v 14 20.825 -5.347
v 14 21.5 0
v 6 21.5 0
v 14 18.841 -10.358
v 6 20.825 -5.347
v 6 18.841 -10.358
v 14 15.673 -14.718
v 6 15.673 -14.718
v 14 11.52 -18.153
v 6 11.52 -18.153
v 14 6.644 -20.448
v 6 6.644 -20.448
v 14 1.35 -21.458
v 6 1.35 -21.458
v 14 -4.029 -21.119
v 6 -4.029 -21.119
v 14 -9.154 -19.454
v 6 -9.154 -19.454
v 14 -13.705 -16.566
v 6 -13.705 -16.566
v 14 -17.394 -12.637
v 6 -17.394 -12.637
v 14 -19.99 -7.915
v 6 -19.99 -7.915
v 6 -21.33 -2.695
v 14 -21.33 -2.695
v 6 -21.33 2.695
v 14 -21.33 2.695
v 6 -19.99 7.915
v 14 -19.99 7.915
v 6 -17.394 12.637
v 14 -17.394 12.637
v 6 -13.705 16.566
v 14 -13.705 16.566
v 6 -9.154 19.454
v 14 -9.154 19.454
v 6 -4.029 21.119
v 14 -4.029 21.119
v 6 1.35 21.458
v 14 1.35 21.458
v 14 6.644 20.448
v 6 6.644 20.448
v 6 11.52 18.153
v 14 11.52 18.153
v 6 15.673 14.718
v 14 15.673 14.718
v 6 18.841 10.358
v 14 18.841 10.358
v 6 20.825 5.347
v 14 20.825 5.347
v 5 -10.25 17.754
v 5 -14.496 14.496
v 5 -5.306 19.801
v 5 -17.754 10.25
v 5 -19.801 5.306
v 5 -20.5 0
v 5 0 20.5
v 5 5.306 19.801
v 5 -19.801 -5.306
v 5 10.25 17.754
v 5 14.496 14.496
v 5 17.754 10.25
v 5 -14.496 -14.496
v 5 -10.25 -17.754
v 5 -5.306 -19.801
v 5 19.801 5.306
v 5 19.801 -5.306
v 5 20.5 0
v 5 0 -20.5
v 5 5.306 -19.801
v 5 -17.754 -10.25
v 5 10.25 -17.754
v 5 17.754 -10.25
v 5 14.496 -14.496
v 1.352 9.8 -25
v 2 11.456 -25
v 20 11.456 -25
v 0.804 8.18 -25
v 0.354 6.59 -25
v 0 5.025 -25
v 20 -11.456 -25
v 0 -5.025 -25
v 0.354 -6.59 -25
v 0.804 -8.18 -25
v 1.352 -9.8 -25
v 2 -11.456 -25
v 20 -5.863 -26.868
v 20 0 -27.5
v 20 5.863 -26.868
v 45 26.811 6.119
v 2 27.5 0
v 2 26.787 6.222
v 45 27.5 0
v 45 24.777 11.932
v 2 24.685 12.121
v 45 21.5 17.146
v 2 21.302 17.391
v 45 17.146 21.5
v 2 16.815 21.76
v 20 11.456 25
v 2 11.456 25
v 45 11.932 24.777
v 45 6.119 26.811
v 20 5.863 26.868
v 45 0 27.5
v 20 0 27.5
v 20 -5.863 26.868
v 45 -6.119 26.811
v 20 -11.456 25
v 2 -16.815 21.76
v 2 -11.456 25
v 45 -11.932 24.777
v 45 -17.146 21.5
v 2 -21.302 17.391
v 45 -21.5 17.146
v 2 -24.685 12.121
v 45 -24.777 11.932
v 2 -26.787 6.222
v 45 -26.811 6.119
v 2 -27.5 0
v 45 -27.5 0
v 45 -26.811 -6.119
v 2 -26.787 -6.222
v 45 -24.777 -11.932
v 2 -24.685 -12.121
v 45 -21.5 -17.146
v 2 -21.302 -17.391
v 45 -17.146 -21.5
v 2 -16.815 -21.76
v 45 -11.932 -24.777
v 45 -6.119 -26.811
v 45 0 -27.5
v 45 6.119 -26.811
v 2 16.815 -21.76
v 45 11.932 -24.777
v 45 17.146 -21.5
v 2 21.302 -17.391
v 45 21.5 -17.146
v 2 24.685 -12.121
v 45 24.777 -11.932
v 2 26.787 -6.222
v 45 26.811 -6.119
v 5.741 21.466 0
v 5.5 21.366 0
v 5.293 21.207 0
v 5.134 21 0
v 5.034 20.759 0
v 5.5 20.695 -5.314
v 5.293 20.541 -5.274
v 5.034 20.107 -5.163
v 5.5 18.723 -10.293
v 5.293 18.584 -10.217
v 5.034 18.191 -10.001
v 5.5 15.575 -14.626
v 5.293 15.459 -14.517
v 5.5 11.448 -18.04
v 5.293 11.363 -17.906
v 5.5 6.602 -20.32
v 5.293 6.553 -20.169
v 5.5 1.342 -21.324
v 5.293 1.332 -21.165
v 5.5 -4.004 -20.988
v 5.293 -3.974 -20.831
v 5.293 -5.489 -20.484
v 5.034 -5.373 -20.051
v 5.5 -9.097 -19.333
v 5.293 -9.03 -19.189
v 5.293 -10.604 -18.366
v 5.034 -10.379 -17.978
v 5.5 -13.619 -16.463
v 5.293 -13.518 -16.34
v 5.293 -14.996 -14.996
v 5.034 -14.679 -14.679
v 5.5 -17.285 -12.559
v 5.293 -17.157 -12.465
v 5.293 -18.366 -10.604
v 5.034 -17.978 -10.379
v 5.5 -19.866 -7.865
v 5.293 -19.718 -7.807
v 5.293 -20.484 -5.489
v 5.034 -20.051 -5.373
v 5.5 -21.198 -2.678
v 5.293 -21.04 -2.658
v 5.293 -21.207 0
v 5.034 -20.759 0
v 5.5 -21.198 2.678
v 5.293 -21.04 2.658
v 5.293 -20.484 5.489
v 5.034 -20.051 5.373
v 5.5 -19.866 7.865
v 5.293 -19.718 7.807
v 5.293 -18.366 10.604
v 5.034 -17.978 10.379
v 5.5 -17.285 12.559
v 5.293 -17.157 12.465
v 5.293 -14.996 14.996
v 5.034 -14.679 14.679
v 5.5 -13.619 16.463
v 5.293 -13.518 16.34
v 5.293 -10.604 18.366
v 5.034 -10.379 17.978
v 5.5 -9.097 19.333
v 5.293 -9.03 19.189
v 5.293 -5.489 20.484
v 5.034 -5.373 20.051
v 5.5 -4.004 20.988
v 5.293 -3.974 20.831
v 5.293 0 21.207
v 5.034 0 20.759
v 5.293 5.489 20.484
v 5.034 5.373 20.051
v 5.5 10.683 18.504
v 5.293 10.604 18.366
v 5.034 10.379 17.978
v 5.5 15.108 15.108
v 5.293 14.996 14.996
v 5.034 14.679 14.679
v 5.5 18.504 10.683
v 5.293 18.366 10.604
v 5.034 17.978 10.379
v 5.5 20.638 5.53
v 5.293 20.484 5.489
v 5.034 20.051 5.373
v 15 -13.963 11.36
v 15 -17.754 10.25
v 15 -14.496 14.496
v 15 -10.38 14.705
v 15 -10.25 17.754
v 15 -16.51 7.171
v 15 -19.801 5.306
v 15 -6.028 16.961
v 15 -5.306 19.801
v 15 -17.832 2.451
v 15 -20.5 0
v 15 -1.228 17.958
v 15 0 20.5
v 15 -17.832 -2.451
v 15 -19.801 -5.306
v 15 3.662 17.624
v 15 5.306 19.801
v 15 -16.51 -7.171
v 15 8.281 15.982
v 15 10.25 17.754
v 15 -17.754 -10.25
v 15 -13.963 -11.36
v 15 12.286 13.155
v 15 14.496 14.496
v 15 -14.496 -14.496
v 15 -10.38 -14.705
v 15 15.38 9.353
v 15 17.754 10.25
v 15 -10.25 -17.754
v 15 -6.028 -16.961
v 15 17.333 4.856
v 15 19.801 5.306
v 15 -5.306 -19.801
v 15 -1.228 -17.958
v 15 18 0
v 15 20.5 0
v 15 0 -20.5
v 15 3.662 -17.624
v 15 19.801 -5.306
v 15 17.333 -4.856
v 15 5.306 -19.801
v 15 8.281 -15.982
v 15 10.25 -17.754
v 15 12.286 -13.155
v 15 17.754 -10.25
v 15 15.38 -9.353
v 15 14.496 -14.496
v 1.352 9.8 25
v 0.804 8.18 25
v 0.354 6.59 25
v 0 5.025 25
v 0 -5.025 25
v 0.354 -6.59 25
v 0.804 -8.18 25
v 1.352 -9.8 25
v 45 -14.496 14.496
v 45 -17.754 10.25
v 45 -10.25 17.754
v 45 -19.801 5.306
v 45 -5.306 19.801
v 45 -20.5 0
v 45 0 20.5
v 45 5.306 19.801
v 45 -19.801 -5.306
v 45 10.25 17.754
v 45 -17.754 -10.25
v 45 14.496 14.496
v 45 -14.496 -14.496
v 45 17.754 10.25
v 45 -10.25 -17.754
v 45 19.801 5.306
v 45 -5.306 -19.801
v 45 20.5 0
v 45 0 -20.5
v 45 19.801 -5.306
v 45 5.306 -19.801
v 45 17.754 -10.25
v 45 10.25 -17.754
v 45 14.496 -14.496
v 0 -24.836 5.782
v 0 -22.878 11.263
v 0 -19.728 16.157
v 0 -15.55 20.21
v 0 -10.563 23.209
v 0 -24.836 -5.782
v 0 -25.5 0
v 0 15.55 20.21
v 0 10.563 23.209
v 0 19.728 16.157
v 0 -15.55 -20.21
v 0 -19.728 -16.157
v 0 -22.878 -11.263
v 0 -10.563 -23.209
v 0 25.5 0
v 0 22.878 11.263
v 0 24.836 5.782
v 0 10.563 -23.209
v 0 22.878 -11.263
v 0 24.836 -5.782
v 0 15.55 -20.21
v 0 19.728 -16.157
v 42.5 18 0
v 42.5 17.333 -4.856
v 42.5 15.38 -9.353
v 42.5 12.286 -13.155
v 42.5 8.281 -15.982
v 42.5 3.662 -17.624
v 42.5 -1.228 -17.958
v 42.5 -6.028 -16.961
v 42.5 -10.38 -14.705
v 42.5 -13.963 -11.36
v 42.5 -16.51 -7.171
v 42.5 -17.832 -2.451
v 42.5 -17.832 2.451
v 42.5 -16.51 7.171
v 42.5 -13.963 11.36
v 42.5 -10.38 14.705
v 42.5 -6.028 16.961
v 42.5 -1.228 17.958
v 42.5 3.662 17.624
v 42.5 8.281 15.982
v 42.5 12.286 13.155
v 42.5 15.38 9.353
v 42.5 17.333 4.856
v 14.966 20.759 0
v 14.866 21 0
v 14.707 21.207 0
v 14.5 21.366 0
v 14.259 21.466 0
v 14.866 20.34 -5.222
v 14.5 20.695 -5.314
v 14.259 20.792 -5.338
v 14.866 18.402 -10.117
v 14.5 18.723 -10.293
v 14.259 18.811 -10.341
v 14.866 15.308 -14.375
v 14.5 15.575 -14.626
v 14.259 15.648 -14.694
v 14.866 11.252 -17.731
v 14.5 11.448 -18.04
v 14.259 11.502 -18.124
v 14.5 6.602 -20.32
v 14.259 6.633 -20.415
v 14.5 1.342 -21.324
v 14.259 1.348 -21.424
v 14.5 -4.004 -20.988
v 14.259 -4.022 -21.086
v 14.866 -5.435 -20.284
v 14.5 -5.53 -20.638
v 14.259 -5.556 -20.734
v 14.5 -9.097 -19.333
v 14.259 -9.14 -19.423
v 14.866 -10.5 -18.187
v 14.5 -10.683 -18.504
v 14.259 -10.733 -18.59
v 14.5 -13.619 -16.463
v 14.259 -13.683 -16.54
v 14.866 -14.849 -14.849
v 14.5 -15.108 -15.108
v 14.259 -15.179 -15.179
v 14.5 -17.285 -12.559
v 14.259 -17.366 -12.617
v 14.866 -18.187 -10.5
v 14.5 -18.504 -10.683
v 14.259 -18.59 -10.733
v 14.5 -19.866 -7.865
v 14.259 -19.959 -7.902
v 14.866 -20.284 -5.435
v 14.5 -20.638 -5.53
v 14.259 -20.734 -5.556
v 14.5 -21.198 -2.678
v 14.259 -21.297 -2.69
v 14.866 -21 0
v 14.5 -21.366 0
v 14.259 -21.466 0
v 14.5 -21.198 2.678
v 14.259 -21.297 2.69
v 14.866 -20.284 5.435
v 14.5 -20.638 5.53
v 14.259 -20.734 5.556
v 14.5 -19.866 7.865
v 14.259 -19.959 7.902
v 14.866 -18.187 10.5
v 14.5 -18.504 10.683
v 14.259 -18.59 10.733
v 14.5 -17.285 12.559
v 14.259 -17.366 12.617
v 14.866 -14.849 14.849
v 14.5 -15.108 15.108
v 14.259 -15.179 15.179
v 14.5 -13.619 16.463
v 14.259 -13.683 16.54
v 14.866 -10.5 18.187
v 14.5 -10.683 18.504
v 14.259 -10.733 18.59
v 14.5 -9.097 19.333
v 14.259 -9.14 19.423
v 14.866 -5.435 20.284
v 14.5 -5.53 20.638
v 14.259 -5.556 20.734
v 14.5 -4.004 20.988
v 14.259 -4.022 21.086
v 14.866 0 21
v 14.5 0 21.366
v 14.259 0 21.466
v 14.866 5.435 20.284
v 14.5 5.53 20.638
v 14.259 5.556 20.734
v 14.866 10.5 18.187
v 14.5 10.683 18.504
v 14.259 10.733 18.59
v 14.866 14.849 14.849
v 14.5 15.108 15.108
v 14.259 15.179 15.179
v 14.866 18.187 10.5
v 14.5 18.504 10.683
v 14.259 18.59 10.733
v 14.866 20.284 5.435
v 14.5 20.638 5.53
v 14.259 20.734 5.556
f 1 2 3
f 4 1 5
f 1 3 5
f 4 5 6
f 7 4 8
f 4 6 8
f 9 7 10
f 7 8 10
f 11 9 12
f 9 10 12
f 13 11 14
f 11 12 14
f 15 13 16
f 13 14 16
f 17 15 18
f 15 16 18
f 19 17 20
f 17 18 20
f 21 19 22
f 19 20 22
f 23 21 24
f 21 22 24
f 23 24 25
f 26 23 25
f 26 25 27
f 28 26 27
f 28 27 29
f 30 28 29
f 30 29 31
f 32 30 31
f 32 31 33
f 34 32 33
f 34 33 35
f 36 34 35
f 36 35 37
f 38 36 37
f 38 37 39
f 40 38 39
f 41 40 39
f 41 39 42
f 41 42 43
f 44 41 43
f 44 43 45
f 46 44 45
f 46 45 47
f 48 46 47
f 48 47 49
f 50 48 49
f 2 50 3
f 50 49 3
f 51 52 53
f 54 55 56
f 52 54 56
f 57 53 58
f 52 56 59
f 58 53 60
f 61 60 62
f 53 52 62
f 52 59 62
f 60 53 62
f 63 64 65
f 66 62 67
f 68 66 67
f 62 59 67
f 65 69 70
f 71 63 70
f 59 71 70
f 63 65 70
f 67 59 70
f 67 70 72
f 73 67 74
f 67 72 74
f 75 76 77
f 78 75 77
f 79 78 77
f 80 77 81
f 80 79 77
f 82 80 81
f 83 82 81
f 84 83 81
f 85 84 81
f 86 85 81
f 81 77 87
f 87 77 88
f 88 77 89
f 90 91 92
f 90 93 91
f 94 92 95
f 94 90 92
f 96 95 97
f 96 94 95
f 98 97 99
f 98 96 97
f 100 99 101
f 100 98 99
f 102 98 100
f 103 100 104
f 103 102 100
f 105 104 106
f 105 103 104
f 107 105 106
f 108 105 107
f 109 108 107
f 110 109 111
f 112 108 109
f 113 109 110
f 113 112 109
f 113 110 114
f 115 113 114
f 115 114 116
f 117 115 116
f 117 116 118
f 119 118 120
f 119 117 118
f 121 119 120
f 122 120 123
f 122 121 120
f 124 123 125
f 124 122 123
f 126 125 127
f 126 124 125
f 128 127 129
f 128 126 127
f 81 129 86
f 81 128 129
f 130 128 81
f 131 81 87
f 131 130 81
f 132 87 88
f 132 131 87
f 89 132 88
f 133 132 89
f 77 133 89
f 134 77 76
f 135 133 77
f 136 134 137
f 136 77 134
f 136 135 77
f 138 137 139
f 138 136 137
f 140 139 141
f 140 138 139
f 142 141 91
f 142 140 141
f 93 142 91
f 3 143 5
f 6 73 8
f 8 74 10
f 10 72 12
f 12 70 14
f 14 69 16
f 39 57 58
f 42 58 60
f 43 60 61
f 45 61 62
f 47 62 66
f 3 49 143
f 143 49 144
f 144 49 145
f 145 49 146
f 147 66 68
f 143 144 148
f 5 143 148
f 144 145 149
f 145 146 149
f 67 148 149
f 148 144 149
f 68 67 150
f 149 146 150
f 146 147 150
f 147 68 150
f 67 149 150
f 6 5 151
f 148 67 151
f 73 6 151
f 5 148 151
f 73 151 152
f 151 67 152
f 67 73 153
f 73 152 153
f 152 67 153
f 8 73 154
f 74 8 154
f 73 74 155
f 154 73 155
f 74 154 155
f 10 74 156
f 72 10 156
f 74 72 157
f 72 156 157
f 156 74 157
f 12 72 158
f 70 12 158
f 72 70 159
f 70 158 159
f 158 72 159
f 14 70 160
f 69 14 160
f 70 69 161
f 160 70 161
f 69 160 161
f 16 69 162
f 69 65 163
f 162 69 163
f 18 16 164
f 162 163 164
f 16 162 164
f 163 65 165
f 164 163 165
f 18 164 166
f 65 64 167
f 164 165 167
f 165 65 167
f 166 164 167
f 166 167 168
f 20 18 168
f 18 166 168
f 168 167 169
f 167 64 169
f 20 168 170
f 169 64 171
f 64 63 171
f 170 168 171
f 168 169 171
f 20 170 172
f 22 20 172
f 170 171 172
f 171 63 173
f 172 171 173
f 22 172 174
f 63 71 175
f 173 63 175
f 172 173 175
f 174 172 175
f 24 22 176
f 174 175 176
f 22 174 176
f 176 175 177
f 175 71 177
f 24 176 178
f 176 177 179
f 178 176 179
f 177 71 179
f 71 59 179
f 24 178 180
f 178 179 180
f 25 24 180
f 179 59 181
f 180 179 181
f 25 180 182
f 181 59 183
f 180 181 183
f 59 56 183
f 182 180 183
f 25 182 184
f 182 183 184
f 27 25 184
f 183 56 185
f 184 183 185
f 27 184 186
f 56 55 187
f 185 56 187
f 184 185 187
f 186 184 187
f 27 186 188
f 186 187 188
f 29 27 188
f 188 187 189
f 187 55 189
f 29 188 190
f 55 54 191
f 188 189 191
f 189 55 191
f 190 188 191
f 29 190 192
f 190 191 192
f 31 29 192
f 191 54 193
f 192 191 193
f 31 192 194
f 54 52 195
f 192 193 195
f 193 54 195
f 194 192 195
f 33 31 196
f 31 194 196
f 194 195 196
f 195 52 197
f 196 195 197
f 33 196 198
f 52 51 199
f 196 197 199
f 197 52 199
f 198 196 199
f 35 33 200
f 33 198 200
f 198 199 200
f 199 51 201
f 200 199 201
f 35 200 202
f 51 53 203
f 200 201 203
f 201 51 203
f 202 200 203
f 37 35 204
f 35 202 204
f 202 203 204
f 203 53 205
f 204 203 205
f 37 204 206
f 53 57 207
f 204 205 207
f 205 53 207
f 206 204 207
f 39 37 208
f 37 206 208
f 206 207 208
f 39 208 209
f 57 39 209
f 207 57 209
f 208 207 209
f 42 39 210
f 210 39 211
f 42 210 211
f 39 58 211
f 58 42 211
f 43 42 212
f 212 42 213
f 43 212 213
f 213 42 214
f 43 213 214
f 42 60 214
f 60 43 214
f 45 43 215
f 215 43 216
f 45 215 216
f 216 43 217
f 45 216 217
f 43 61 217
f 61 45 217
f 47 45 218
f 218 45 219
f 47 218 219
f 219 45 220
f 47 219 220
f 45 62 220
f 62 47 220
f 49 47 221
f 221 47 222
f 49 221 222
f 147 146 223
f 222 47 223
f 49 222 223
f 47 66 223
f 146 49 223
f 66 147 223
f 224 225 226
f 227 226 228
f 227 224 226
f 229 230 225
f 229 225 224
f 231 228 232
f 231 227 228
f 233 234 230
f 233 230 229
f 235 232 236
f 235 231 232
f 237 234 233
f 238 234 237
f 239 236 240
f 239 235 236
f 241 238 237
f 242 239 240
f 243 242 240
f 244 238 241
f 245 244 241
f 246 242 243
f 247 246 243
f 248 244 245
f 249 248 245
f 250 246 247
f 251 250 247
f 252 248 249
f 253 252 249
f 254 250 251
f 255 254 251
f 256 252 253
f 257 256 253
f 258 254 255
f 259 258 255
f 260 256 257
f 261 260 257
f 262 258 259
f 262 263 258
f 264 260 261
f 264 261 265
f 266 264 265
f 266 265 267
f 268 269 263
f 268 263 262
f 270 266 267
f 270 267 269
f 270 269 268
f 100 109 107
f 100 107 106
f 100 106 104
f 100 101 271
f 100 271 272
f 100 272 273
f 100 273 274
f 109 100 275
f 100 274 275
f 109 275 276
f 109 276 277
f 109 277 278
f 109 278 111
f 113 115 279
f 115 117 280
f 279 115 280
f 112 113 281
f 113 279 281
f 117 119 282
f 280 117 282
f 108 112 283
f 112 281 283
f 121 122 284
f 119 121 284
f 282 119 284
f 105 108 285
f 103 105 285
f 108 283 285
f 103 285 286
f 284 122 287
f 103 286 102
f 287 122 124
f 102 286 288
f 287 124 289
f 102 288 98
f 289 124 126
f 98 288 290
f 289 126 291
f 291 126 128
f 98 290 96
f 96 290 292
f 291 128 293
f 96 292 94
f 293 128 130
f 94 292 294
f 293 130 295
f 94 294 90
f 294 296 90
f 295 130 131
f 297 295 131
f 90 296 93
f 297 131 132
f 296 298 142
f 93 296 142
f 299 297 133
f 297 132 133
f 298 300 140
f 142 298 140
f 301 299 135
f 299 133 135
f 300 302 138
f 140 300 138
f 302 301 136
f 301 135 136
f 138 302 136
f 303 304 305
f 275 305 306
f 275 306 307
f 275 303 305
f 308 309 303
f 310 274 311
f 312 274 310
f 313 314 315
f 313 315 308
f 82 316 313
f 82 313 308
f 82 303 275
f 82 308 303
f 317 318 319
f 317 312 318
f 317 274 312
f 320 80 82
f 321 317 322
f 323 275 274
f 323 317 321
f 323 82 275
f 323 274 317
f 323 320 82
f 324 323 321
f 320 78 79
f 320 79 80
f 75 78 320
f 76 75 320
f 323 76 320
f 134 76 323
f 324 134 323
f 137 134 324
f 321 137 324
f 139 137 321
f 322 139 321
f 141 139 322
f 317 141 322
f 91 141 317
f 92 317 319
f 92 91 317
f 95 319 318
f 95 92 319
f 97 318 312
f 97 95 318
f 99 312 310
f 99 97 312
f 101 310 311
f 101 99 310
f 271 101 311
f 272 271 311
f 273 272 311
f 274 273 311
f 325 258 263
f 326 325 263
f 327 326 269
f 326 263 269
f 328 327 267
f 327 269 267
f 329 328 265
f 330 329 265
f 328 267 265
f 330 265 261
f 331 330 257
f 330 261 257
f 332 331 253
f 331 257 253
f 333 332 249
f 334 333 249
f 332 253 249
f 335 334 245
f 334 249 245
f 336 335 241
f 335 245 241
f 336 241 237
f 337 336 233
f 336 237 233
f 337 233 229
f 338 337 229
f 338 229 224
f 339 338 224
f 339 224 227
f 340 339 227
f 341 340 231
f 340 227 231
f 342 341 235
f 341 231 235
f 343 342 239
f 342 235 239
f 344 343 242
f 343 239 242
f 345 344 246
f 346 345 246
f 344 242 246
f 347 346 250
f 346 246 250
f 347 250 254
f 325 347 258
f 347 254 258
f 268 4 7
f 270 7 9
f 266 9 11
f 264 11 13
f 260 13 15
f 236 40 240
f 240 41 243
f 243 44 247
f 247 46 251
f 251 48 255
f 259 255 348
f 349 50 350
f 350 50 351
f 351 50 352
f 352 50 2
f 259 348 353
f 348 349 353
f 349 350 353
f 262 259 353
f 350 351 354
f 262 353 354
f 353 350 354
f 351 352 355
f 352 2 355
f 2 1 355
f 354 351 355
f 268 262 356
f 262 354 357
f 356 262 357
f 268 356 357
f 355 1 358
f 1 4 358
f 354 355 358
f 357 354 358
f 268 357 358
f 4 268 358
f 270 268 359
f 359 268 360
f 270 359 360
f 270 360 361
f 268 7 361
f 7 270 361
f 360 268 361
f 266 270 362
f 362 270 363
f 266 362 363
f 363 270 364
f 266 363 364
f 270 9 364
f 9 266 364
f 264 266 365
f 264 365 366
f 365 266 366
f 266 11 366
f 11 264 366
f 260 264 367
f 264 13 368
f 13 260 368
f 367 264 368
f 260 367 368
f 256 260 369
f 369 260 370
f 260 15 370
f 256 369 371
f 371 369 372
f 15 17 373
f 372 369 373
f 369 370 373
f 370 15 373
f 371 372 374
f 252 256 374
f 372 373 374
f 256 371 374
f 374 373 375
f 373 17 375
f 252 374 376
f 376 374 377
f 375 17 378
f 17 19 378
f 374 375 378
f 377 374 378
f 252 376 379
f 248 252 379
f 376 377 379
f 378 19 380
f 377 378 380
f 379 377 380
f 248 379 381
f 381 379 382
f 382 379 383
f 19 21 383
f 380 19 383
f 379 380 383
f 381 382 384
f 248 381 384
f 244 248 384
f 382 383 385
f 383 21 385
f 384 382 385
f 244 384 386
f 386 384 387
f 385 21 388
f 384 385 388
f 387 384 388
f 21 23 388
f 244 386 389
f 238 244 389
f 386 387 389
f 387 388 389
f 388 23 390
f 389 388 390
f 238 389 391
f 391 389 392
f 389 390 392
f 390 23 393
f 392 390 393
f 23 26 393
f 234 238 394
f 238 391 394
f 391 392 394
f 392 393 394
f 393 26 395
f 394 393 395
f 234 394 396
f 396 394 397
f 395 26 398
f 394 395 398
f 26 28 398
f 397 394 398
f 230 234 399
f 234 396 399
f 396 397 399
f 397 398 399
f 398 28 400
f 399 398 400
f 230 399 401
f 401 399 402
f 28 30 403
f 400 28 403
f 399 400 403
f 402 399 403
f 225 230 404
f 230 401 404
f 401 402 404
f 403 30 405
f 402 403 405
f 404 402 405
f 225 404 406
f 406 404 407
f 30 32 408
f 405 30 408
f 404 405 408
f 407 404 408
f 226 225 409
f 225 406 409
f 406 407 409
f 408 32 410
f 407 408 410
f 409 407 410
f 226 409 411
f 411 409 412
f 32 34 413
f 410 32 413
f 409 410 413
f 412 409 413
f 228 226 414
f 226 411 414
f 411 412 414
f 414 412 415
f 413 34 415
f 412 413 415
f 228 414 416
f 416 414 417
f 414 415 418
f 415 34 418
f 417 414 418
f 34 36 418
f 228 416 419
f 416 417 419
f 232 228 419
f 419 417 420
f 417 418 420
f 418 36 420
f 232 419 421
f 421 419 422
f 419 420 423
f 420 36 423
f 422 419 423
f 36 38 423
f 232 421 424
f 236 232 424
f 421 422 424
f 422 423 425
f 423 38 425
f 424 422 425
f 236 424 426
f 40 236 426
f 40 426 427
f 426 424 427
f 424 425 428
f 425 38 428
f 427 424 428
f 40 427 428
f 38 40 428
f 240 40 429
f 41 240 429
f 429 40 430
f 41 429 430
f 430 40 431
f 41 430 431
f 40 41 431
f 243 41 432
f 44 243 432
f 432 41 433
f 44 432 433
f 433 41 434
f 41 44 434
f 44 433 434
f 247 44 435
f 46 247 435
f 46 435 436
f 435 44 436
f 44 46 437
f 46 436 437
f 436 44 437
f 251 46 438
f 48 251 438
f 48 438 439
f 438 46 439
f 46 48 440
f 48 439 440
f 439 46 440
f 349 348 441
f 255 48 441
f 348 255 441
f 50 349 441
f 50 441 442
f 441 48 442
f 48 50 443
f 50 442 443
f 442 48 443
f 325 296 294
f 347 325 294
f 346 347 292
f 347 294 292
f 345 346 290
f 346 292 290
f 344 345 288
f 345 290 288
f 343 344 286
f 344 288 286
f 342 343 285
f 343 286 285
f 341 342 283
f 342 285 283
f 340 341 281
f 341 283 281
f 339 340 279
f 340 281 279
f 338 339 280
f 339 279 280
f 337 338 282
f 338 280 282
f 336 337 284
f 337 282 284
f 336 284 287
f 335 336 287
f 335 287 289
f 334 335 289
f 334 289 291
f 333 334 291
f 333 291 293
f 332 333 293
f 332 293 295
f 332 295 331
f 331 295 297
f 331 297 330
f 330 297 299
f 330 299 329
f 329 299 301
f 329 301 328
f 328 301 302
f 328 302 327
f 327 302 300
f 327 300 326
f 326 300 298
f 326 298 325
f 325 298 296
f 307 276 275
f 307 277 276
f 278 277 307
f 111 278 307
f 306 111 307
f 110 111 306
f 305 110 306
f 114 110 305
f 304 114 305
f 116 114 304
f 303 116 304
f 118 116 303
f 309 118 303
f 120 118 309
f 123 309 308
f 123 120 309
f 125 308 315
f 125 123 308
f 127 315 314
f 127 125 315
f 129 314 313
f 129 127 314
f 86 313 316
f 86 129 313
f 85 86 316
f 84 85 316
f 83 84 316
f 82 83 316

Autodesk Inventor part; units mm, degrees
ref_plane "YZ Plane" through (0, 0, 0) normal (1, 0, 0) x (0, 1, 0)
ref_plane "XZ Plane" through (0, 0, 0) normal (0, 1, 0) x (-1, 0, 0)
ref_plane "XY Plane" through (0, 0, 0) normal (0, 0, 1) x (1, 0, 0)
sketch "Esboço1" plane through (0, 0, 0) normal (0, 0, 1) x (1, 0, 0)
  line L0 (0, 0) -> (0, 27.5)
  line L1 (0, 27.5) -> (45, 27.5)
  line L2 (45, 27.5) -> (45, 18)
  line L3 (45, 18) -> (15, 18)
  line L4 (15, 18) -> (15, 20.5)
  line L5 (14, 21.5) -> (6, 21.5)
  line L6 (5, 20.5) -> (5, 0)
  line L7 (5, 0) -> (0, 0)
  arc A0 (6, 21.5) -> (5, 20.5) centre (6, 20.5) ccw
  arc A1 (15, 20.5) -> (14, 21.5) centre (14, 20.5) ccw
  point P0 (15, 21.5)
  point P1 (5, 21.5)
  point P2 (2.5, 0)
  dimension "d0" = 55
  dimension "d1" = 45
  dimension "d2" = 40
  dimension "d3" = 10
  dimension "d4" = 43
  dimension "d5" = 36
  dimension "d7" = 1
revolve "Revolução1" add sketch "Esboço1" angle 360 about axis through (5, 0, 0) along (-1, 0, 0)
thread "Rosca1" size "M36x4" class "6H" standard "ANSI Metric M Profile" full length
chamfer "Chanfro1" distance 2.5 angle 45 1 edges at (45, -18, 0)
chamfer "Chanfro2" distance 2 angle 45 1 edges at (0, -27.5, 0)
sketch "Esboço2" plane through (0, 0, 0) normal (-1, 0, 0) x (0, 0, 1)
  line L0 (35, 15) -> (25, 15)
  line L1 (25, 15) -> (25, -15)
  line L2 (25, -15) -> (35, -15)
  line L3 (35, -15) -> (35, 15)
  line L4 (0, 0) -> (0, 48.3758) construction
  line L5 (-35, 15) -> (-25, 15)
  line L6 (-25, 15) -> (-25, -15)
  line L7 (-25, -15) -> (-35, -15)
  line L8 (-35, -15) -> (-35, 15)
  point P0 (25, 0)
  point P1 (35, 0)
  point P2 (30, -15)
  point P3 (-25, 0)
  point P4 (-35, 0)
  point P5 (-30, -15)
  dimension "d17" = 25
  dimension "d18" = 30
  dimension "d19" = 10
extrude "Extrusão1" cut sketch "Esboço2" against normal blind 20
properties part number "3D Model"
